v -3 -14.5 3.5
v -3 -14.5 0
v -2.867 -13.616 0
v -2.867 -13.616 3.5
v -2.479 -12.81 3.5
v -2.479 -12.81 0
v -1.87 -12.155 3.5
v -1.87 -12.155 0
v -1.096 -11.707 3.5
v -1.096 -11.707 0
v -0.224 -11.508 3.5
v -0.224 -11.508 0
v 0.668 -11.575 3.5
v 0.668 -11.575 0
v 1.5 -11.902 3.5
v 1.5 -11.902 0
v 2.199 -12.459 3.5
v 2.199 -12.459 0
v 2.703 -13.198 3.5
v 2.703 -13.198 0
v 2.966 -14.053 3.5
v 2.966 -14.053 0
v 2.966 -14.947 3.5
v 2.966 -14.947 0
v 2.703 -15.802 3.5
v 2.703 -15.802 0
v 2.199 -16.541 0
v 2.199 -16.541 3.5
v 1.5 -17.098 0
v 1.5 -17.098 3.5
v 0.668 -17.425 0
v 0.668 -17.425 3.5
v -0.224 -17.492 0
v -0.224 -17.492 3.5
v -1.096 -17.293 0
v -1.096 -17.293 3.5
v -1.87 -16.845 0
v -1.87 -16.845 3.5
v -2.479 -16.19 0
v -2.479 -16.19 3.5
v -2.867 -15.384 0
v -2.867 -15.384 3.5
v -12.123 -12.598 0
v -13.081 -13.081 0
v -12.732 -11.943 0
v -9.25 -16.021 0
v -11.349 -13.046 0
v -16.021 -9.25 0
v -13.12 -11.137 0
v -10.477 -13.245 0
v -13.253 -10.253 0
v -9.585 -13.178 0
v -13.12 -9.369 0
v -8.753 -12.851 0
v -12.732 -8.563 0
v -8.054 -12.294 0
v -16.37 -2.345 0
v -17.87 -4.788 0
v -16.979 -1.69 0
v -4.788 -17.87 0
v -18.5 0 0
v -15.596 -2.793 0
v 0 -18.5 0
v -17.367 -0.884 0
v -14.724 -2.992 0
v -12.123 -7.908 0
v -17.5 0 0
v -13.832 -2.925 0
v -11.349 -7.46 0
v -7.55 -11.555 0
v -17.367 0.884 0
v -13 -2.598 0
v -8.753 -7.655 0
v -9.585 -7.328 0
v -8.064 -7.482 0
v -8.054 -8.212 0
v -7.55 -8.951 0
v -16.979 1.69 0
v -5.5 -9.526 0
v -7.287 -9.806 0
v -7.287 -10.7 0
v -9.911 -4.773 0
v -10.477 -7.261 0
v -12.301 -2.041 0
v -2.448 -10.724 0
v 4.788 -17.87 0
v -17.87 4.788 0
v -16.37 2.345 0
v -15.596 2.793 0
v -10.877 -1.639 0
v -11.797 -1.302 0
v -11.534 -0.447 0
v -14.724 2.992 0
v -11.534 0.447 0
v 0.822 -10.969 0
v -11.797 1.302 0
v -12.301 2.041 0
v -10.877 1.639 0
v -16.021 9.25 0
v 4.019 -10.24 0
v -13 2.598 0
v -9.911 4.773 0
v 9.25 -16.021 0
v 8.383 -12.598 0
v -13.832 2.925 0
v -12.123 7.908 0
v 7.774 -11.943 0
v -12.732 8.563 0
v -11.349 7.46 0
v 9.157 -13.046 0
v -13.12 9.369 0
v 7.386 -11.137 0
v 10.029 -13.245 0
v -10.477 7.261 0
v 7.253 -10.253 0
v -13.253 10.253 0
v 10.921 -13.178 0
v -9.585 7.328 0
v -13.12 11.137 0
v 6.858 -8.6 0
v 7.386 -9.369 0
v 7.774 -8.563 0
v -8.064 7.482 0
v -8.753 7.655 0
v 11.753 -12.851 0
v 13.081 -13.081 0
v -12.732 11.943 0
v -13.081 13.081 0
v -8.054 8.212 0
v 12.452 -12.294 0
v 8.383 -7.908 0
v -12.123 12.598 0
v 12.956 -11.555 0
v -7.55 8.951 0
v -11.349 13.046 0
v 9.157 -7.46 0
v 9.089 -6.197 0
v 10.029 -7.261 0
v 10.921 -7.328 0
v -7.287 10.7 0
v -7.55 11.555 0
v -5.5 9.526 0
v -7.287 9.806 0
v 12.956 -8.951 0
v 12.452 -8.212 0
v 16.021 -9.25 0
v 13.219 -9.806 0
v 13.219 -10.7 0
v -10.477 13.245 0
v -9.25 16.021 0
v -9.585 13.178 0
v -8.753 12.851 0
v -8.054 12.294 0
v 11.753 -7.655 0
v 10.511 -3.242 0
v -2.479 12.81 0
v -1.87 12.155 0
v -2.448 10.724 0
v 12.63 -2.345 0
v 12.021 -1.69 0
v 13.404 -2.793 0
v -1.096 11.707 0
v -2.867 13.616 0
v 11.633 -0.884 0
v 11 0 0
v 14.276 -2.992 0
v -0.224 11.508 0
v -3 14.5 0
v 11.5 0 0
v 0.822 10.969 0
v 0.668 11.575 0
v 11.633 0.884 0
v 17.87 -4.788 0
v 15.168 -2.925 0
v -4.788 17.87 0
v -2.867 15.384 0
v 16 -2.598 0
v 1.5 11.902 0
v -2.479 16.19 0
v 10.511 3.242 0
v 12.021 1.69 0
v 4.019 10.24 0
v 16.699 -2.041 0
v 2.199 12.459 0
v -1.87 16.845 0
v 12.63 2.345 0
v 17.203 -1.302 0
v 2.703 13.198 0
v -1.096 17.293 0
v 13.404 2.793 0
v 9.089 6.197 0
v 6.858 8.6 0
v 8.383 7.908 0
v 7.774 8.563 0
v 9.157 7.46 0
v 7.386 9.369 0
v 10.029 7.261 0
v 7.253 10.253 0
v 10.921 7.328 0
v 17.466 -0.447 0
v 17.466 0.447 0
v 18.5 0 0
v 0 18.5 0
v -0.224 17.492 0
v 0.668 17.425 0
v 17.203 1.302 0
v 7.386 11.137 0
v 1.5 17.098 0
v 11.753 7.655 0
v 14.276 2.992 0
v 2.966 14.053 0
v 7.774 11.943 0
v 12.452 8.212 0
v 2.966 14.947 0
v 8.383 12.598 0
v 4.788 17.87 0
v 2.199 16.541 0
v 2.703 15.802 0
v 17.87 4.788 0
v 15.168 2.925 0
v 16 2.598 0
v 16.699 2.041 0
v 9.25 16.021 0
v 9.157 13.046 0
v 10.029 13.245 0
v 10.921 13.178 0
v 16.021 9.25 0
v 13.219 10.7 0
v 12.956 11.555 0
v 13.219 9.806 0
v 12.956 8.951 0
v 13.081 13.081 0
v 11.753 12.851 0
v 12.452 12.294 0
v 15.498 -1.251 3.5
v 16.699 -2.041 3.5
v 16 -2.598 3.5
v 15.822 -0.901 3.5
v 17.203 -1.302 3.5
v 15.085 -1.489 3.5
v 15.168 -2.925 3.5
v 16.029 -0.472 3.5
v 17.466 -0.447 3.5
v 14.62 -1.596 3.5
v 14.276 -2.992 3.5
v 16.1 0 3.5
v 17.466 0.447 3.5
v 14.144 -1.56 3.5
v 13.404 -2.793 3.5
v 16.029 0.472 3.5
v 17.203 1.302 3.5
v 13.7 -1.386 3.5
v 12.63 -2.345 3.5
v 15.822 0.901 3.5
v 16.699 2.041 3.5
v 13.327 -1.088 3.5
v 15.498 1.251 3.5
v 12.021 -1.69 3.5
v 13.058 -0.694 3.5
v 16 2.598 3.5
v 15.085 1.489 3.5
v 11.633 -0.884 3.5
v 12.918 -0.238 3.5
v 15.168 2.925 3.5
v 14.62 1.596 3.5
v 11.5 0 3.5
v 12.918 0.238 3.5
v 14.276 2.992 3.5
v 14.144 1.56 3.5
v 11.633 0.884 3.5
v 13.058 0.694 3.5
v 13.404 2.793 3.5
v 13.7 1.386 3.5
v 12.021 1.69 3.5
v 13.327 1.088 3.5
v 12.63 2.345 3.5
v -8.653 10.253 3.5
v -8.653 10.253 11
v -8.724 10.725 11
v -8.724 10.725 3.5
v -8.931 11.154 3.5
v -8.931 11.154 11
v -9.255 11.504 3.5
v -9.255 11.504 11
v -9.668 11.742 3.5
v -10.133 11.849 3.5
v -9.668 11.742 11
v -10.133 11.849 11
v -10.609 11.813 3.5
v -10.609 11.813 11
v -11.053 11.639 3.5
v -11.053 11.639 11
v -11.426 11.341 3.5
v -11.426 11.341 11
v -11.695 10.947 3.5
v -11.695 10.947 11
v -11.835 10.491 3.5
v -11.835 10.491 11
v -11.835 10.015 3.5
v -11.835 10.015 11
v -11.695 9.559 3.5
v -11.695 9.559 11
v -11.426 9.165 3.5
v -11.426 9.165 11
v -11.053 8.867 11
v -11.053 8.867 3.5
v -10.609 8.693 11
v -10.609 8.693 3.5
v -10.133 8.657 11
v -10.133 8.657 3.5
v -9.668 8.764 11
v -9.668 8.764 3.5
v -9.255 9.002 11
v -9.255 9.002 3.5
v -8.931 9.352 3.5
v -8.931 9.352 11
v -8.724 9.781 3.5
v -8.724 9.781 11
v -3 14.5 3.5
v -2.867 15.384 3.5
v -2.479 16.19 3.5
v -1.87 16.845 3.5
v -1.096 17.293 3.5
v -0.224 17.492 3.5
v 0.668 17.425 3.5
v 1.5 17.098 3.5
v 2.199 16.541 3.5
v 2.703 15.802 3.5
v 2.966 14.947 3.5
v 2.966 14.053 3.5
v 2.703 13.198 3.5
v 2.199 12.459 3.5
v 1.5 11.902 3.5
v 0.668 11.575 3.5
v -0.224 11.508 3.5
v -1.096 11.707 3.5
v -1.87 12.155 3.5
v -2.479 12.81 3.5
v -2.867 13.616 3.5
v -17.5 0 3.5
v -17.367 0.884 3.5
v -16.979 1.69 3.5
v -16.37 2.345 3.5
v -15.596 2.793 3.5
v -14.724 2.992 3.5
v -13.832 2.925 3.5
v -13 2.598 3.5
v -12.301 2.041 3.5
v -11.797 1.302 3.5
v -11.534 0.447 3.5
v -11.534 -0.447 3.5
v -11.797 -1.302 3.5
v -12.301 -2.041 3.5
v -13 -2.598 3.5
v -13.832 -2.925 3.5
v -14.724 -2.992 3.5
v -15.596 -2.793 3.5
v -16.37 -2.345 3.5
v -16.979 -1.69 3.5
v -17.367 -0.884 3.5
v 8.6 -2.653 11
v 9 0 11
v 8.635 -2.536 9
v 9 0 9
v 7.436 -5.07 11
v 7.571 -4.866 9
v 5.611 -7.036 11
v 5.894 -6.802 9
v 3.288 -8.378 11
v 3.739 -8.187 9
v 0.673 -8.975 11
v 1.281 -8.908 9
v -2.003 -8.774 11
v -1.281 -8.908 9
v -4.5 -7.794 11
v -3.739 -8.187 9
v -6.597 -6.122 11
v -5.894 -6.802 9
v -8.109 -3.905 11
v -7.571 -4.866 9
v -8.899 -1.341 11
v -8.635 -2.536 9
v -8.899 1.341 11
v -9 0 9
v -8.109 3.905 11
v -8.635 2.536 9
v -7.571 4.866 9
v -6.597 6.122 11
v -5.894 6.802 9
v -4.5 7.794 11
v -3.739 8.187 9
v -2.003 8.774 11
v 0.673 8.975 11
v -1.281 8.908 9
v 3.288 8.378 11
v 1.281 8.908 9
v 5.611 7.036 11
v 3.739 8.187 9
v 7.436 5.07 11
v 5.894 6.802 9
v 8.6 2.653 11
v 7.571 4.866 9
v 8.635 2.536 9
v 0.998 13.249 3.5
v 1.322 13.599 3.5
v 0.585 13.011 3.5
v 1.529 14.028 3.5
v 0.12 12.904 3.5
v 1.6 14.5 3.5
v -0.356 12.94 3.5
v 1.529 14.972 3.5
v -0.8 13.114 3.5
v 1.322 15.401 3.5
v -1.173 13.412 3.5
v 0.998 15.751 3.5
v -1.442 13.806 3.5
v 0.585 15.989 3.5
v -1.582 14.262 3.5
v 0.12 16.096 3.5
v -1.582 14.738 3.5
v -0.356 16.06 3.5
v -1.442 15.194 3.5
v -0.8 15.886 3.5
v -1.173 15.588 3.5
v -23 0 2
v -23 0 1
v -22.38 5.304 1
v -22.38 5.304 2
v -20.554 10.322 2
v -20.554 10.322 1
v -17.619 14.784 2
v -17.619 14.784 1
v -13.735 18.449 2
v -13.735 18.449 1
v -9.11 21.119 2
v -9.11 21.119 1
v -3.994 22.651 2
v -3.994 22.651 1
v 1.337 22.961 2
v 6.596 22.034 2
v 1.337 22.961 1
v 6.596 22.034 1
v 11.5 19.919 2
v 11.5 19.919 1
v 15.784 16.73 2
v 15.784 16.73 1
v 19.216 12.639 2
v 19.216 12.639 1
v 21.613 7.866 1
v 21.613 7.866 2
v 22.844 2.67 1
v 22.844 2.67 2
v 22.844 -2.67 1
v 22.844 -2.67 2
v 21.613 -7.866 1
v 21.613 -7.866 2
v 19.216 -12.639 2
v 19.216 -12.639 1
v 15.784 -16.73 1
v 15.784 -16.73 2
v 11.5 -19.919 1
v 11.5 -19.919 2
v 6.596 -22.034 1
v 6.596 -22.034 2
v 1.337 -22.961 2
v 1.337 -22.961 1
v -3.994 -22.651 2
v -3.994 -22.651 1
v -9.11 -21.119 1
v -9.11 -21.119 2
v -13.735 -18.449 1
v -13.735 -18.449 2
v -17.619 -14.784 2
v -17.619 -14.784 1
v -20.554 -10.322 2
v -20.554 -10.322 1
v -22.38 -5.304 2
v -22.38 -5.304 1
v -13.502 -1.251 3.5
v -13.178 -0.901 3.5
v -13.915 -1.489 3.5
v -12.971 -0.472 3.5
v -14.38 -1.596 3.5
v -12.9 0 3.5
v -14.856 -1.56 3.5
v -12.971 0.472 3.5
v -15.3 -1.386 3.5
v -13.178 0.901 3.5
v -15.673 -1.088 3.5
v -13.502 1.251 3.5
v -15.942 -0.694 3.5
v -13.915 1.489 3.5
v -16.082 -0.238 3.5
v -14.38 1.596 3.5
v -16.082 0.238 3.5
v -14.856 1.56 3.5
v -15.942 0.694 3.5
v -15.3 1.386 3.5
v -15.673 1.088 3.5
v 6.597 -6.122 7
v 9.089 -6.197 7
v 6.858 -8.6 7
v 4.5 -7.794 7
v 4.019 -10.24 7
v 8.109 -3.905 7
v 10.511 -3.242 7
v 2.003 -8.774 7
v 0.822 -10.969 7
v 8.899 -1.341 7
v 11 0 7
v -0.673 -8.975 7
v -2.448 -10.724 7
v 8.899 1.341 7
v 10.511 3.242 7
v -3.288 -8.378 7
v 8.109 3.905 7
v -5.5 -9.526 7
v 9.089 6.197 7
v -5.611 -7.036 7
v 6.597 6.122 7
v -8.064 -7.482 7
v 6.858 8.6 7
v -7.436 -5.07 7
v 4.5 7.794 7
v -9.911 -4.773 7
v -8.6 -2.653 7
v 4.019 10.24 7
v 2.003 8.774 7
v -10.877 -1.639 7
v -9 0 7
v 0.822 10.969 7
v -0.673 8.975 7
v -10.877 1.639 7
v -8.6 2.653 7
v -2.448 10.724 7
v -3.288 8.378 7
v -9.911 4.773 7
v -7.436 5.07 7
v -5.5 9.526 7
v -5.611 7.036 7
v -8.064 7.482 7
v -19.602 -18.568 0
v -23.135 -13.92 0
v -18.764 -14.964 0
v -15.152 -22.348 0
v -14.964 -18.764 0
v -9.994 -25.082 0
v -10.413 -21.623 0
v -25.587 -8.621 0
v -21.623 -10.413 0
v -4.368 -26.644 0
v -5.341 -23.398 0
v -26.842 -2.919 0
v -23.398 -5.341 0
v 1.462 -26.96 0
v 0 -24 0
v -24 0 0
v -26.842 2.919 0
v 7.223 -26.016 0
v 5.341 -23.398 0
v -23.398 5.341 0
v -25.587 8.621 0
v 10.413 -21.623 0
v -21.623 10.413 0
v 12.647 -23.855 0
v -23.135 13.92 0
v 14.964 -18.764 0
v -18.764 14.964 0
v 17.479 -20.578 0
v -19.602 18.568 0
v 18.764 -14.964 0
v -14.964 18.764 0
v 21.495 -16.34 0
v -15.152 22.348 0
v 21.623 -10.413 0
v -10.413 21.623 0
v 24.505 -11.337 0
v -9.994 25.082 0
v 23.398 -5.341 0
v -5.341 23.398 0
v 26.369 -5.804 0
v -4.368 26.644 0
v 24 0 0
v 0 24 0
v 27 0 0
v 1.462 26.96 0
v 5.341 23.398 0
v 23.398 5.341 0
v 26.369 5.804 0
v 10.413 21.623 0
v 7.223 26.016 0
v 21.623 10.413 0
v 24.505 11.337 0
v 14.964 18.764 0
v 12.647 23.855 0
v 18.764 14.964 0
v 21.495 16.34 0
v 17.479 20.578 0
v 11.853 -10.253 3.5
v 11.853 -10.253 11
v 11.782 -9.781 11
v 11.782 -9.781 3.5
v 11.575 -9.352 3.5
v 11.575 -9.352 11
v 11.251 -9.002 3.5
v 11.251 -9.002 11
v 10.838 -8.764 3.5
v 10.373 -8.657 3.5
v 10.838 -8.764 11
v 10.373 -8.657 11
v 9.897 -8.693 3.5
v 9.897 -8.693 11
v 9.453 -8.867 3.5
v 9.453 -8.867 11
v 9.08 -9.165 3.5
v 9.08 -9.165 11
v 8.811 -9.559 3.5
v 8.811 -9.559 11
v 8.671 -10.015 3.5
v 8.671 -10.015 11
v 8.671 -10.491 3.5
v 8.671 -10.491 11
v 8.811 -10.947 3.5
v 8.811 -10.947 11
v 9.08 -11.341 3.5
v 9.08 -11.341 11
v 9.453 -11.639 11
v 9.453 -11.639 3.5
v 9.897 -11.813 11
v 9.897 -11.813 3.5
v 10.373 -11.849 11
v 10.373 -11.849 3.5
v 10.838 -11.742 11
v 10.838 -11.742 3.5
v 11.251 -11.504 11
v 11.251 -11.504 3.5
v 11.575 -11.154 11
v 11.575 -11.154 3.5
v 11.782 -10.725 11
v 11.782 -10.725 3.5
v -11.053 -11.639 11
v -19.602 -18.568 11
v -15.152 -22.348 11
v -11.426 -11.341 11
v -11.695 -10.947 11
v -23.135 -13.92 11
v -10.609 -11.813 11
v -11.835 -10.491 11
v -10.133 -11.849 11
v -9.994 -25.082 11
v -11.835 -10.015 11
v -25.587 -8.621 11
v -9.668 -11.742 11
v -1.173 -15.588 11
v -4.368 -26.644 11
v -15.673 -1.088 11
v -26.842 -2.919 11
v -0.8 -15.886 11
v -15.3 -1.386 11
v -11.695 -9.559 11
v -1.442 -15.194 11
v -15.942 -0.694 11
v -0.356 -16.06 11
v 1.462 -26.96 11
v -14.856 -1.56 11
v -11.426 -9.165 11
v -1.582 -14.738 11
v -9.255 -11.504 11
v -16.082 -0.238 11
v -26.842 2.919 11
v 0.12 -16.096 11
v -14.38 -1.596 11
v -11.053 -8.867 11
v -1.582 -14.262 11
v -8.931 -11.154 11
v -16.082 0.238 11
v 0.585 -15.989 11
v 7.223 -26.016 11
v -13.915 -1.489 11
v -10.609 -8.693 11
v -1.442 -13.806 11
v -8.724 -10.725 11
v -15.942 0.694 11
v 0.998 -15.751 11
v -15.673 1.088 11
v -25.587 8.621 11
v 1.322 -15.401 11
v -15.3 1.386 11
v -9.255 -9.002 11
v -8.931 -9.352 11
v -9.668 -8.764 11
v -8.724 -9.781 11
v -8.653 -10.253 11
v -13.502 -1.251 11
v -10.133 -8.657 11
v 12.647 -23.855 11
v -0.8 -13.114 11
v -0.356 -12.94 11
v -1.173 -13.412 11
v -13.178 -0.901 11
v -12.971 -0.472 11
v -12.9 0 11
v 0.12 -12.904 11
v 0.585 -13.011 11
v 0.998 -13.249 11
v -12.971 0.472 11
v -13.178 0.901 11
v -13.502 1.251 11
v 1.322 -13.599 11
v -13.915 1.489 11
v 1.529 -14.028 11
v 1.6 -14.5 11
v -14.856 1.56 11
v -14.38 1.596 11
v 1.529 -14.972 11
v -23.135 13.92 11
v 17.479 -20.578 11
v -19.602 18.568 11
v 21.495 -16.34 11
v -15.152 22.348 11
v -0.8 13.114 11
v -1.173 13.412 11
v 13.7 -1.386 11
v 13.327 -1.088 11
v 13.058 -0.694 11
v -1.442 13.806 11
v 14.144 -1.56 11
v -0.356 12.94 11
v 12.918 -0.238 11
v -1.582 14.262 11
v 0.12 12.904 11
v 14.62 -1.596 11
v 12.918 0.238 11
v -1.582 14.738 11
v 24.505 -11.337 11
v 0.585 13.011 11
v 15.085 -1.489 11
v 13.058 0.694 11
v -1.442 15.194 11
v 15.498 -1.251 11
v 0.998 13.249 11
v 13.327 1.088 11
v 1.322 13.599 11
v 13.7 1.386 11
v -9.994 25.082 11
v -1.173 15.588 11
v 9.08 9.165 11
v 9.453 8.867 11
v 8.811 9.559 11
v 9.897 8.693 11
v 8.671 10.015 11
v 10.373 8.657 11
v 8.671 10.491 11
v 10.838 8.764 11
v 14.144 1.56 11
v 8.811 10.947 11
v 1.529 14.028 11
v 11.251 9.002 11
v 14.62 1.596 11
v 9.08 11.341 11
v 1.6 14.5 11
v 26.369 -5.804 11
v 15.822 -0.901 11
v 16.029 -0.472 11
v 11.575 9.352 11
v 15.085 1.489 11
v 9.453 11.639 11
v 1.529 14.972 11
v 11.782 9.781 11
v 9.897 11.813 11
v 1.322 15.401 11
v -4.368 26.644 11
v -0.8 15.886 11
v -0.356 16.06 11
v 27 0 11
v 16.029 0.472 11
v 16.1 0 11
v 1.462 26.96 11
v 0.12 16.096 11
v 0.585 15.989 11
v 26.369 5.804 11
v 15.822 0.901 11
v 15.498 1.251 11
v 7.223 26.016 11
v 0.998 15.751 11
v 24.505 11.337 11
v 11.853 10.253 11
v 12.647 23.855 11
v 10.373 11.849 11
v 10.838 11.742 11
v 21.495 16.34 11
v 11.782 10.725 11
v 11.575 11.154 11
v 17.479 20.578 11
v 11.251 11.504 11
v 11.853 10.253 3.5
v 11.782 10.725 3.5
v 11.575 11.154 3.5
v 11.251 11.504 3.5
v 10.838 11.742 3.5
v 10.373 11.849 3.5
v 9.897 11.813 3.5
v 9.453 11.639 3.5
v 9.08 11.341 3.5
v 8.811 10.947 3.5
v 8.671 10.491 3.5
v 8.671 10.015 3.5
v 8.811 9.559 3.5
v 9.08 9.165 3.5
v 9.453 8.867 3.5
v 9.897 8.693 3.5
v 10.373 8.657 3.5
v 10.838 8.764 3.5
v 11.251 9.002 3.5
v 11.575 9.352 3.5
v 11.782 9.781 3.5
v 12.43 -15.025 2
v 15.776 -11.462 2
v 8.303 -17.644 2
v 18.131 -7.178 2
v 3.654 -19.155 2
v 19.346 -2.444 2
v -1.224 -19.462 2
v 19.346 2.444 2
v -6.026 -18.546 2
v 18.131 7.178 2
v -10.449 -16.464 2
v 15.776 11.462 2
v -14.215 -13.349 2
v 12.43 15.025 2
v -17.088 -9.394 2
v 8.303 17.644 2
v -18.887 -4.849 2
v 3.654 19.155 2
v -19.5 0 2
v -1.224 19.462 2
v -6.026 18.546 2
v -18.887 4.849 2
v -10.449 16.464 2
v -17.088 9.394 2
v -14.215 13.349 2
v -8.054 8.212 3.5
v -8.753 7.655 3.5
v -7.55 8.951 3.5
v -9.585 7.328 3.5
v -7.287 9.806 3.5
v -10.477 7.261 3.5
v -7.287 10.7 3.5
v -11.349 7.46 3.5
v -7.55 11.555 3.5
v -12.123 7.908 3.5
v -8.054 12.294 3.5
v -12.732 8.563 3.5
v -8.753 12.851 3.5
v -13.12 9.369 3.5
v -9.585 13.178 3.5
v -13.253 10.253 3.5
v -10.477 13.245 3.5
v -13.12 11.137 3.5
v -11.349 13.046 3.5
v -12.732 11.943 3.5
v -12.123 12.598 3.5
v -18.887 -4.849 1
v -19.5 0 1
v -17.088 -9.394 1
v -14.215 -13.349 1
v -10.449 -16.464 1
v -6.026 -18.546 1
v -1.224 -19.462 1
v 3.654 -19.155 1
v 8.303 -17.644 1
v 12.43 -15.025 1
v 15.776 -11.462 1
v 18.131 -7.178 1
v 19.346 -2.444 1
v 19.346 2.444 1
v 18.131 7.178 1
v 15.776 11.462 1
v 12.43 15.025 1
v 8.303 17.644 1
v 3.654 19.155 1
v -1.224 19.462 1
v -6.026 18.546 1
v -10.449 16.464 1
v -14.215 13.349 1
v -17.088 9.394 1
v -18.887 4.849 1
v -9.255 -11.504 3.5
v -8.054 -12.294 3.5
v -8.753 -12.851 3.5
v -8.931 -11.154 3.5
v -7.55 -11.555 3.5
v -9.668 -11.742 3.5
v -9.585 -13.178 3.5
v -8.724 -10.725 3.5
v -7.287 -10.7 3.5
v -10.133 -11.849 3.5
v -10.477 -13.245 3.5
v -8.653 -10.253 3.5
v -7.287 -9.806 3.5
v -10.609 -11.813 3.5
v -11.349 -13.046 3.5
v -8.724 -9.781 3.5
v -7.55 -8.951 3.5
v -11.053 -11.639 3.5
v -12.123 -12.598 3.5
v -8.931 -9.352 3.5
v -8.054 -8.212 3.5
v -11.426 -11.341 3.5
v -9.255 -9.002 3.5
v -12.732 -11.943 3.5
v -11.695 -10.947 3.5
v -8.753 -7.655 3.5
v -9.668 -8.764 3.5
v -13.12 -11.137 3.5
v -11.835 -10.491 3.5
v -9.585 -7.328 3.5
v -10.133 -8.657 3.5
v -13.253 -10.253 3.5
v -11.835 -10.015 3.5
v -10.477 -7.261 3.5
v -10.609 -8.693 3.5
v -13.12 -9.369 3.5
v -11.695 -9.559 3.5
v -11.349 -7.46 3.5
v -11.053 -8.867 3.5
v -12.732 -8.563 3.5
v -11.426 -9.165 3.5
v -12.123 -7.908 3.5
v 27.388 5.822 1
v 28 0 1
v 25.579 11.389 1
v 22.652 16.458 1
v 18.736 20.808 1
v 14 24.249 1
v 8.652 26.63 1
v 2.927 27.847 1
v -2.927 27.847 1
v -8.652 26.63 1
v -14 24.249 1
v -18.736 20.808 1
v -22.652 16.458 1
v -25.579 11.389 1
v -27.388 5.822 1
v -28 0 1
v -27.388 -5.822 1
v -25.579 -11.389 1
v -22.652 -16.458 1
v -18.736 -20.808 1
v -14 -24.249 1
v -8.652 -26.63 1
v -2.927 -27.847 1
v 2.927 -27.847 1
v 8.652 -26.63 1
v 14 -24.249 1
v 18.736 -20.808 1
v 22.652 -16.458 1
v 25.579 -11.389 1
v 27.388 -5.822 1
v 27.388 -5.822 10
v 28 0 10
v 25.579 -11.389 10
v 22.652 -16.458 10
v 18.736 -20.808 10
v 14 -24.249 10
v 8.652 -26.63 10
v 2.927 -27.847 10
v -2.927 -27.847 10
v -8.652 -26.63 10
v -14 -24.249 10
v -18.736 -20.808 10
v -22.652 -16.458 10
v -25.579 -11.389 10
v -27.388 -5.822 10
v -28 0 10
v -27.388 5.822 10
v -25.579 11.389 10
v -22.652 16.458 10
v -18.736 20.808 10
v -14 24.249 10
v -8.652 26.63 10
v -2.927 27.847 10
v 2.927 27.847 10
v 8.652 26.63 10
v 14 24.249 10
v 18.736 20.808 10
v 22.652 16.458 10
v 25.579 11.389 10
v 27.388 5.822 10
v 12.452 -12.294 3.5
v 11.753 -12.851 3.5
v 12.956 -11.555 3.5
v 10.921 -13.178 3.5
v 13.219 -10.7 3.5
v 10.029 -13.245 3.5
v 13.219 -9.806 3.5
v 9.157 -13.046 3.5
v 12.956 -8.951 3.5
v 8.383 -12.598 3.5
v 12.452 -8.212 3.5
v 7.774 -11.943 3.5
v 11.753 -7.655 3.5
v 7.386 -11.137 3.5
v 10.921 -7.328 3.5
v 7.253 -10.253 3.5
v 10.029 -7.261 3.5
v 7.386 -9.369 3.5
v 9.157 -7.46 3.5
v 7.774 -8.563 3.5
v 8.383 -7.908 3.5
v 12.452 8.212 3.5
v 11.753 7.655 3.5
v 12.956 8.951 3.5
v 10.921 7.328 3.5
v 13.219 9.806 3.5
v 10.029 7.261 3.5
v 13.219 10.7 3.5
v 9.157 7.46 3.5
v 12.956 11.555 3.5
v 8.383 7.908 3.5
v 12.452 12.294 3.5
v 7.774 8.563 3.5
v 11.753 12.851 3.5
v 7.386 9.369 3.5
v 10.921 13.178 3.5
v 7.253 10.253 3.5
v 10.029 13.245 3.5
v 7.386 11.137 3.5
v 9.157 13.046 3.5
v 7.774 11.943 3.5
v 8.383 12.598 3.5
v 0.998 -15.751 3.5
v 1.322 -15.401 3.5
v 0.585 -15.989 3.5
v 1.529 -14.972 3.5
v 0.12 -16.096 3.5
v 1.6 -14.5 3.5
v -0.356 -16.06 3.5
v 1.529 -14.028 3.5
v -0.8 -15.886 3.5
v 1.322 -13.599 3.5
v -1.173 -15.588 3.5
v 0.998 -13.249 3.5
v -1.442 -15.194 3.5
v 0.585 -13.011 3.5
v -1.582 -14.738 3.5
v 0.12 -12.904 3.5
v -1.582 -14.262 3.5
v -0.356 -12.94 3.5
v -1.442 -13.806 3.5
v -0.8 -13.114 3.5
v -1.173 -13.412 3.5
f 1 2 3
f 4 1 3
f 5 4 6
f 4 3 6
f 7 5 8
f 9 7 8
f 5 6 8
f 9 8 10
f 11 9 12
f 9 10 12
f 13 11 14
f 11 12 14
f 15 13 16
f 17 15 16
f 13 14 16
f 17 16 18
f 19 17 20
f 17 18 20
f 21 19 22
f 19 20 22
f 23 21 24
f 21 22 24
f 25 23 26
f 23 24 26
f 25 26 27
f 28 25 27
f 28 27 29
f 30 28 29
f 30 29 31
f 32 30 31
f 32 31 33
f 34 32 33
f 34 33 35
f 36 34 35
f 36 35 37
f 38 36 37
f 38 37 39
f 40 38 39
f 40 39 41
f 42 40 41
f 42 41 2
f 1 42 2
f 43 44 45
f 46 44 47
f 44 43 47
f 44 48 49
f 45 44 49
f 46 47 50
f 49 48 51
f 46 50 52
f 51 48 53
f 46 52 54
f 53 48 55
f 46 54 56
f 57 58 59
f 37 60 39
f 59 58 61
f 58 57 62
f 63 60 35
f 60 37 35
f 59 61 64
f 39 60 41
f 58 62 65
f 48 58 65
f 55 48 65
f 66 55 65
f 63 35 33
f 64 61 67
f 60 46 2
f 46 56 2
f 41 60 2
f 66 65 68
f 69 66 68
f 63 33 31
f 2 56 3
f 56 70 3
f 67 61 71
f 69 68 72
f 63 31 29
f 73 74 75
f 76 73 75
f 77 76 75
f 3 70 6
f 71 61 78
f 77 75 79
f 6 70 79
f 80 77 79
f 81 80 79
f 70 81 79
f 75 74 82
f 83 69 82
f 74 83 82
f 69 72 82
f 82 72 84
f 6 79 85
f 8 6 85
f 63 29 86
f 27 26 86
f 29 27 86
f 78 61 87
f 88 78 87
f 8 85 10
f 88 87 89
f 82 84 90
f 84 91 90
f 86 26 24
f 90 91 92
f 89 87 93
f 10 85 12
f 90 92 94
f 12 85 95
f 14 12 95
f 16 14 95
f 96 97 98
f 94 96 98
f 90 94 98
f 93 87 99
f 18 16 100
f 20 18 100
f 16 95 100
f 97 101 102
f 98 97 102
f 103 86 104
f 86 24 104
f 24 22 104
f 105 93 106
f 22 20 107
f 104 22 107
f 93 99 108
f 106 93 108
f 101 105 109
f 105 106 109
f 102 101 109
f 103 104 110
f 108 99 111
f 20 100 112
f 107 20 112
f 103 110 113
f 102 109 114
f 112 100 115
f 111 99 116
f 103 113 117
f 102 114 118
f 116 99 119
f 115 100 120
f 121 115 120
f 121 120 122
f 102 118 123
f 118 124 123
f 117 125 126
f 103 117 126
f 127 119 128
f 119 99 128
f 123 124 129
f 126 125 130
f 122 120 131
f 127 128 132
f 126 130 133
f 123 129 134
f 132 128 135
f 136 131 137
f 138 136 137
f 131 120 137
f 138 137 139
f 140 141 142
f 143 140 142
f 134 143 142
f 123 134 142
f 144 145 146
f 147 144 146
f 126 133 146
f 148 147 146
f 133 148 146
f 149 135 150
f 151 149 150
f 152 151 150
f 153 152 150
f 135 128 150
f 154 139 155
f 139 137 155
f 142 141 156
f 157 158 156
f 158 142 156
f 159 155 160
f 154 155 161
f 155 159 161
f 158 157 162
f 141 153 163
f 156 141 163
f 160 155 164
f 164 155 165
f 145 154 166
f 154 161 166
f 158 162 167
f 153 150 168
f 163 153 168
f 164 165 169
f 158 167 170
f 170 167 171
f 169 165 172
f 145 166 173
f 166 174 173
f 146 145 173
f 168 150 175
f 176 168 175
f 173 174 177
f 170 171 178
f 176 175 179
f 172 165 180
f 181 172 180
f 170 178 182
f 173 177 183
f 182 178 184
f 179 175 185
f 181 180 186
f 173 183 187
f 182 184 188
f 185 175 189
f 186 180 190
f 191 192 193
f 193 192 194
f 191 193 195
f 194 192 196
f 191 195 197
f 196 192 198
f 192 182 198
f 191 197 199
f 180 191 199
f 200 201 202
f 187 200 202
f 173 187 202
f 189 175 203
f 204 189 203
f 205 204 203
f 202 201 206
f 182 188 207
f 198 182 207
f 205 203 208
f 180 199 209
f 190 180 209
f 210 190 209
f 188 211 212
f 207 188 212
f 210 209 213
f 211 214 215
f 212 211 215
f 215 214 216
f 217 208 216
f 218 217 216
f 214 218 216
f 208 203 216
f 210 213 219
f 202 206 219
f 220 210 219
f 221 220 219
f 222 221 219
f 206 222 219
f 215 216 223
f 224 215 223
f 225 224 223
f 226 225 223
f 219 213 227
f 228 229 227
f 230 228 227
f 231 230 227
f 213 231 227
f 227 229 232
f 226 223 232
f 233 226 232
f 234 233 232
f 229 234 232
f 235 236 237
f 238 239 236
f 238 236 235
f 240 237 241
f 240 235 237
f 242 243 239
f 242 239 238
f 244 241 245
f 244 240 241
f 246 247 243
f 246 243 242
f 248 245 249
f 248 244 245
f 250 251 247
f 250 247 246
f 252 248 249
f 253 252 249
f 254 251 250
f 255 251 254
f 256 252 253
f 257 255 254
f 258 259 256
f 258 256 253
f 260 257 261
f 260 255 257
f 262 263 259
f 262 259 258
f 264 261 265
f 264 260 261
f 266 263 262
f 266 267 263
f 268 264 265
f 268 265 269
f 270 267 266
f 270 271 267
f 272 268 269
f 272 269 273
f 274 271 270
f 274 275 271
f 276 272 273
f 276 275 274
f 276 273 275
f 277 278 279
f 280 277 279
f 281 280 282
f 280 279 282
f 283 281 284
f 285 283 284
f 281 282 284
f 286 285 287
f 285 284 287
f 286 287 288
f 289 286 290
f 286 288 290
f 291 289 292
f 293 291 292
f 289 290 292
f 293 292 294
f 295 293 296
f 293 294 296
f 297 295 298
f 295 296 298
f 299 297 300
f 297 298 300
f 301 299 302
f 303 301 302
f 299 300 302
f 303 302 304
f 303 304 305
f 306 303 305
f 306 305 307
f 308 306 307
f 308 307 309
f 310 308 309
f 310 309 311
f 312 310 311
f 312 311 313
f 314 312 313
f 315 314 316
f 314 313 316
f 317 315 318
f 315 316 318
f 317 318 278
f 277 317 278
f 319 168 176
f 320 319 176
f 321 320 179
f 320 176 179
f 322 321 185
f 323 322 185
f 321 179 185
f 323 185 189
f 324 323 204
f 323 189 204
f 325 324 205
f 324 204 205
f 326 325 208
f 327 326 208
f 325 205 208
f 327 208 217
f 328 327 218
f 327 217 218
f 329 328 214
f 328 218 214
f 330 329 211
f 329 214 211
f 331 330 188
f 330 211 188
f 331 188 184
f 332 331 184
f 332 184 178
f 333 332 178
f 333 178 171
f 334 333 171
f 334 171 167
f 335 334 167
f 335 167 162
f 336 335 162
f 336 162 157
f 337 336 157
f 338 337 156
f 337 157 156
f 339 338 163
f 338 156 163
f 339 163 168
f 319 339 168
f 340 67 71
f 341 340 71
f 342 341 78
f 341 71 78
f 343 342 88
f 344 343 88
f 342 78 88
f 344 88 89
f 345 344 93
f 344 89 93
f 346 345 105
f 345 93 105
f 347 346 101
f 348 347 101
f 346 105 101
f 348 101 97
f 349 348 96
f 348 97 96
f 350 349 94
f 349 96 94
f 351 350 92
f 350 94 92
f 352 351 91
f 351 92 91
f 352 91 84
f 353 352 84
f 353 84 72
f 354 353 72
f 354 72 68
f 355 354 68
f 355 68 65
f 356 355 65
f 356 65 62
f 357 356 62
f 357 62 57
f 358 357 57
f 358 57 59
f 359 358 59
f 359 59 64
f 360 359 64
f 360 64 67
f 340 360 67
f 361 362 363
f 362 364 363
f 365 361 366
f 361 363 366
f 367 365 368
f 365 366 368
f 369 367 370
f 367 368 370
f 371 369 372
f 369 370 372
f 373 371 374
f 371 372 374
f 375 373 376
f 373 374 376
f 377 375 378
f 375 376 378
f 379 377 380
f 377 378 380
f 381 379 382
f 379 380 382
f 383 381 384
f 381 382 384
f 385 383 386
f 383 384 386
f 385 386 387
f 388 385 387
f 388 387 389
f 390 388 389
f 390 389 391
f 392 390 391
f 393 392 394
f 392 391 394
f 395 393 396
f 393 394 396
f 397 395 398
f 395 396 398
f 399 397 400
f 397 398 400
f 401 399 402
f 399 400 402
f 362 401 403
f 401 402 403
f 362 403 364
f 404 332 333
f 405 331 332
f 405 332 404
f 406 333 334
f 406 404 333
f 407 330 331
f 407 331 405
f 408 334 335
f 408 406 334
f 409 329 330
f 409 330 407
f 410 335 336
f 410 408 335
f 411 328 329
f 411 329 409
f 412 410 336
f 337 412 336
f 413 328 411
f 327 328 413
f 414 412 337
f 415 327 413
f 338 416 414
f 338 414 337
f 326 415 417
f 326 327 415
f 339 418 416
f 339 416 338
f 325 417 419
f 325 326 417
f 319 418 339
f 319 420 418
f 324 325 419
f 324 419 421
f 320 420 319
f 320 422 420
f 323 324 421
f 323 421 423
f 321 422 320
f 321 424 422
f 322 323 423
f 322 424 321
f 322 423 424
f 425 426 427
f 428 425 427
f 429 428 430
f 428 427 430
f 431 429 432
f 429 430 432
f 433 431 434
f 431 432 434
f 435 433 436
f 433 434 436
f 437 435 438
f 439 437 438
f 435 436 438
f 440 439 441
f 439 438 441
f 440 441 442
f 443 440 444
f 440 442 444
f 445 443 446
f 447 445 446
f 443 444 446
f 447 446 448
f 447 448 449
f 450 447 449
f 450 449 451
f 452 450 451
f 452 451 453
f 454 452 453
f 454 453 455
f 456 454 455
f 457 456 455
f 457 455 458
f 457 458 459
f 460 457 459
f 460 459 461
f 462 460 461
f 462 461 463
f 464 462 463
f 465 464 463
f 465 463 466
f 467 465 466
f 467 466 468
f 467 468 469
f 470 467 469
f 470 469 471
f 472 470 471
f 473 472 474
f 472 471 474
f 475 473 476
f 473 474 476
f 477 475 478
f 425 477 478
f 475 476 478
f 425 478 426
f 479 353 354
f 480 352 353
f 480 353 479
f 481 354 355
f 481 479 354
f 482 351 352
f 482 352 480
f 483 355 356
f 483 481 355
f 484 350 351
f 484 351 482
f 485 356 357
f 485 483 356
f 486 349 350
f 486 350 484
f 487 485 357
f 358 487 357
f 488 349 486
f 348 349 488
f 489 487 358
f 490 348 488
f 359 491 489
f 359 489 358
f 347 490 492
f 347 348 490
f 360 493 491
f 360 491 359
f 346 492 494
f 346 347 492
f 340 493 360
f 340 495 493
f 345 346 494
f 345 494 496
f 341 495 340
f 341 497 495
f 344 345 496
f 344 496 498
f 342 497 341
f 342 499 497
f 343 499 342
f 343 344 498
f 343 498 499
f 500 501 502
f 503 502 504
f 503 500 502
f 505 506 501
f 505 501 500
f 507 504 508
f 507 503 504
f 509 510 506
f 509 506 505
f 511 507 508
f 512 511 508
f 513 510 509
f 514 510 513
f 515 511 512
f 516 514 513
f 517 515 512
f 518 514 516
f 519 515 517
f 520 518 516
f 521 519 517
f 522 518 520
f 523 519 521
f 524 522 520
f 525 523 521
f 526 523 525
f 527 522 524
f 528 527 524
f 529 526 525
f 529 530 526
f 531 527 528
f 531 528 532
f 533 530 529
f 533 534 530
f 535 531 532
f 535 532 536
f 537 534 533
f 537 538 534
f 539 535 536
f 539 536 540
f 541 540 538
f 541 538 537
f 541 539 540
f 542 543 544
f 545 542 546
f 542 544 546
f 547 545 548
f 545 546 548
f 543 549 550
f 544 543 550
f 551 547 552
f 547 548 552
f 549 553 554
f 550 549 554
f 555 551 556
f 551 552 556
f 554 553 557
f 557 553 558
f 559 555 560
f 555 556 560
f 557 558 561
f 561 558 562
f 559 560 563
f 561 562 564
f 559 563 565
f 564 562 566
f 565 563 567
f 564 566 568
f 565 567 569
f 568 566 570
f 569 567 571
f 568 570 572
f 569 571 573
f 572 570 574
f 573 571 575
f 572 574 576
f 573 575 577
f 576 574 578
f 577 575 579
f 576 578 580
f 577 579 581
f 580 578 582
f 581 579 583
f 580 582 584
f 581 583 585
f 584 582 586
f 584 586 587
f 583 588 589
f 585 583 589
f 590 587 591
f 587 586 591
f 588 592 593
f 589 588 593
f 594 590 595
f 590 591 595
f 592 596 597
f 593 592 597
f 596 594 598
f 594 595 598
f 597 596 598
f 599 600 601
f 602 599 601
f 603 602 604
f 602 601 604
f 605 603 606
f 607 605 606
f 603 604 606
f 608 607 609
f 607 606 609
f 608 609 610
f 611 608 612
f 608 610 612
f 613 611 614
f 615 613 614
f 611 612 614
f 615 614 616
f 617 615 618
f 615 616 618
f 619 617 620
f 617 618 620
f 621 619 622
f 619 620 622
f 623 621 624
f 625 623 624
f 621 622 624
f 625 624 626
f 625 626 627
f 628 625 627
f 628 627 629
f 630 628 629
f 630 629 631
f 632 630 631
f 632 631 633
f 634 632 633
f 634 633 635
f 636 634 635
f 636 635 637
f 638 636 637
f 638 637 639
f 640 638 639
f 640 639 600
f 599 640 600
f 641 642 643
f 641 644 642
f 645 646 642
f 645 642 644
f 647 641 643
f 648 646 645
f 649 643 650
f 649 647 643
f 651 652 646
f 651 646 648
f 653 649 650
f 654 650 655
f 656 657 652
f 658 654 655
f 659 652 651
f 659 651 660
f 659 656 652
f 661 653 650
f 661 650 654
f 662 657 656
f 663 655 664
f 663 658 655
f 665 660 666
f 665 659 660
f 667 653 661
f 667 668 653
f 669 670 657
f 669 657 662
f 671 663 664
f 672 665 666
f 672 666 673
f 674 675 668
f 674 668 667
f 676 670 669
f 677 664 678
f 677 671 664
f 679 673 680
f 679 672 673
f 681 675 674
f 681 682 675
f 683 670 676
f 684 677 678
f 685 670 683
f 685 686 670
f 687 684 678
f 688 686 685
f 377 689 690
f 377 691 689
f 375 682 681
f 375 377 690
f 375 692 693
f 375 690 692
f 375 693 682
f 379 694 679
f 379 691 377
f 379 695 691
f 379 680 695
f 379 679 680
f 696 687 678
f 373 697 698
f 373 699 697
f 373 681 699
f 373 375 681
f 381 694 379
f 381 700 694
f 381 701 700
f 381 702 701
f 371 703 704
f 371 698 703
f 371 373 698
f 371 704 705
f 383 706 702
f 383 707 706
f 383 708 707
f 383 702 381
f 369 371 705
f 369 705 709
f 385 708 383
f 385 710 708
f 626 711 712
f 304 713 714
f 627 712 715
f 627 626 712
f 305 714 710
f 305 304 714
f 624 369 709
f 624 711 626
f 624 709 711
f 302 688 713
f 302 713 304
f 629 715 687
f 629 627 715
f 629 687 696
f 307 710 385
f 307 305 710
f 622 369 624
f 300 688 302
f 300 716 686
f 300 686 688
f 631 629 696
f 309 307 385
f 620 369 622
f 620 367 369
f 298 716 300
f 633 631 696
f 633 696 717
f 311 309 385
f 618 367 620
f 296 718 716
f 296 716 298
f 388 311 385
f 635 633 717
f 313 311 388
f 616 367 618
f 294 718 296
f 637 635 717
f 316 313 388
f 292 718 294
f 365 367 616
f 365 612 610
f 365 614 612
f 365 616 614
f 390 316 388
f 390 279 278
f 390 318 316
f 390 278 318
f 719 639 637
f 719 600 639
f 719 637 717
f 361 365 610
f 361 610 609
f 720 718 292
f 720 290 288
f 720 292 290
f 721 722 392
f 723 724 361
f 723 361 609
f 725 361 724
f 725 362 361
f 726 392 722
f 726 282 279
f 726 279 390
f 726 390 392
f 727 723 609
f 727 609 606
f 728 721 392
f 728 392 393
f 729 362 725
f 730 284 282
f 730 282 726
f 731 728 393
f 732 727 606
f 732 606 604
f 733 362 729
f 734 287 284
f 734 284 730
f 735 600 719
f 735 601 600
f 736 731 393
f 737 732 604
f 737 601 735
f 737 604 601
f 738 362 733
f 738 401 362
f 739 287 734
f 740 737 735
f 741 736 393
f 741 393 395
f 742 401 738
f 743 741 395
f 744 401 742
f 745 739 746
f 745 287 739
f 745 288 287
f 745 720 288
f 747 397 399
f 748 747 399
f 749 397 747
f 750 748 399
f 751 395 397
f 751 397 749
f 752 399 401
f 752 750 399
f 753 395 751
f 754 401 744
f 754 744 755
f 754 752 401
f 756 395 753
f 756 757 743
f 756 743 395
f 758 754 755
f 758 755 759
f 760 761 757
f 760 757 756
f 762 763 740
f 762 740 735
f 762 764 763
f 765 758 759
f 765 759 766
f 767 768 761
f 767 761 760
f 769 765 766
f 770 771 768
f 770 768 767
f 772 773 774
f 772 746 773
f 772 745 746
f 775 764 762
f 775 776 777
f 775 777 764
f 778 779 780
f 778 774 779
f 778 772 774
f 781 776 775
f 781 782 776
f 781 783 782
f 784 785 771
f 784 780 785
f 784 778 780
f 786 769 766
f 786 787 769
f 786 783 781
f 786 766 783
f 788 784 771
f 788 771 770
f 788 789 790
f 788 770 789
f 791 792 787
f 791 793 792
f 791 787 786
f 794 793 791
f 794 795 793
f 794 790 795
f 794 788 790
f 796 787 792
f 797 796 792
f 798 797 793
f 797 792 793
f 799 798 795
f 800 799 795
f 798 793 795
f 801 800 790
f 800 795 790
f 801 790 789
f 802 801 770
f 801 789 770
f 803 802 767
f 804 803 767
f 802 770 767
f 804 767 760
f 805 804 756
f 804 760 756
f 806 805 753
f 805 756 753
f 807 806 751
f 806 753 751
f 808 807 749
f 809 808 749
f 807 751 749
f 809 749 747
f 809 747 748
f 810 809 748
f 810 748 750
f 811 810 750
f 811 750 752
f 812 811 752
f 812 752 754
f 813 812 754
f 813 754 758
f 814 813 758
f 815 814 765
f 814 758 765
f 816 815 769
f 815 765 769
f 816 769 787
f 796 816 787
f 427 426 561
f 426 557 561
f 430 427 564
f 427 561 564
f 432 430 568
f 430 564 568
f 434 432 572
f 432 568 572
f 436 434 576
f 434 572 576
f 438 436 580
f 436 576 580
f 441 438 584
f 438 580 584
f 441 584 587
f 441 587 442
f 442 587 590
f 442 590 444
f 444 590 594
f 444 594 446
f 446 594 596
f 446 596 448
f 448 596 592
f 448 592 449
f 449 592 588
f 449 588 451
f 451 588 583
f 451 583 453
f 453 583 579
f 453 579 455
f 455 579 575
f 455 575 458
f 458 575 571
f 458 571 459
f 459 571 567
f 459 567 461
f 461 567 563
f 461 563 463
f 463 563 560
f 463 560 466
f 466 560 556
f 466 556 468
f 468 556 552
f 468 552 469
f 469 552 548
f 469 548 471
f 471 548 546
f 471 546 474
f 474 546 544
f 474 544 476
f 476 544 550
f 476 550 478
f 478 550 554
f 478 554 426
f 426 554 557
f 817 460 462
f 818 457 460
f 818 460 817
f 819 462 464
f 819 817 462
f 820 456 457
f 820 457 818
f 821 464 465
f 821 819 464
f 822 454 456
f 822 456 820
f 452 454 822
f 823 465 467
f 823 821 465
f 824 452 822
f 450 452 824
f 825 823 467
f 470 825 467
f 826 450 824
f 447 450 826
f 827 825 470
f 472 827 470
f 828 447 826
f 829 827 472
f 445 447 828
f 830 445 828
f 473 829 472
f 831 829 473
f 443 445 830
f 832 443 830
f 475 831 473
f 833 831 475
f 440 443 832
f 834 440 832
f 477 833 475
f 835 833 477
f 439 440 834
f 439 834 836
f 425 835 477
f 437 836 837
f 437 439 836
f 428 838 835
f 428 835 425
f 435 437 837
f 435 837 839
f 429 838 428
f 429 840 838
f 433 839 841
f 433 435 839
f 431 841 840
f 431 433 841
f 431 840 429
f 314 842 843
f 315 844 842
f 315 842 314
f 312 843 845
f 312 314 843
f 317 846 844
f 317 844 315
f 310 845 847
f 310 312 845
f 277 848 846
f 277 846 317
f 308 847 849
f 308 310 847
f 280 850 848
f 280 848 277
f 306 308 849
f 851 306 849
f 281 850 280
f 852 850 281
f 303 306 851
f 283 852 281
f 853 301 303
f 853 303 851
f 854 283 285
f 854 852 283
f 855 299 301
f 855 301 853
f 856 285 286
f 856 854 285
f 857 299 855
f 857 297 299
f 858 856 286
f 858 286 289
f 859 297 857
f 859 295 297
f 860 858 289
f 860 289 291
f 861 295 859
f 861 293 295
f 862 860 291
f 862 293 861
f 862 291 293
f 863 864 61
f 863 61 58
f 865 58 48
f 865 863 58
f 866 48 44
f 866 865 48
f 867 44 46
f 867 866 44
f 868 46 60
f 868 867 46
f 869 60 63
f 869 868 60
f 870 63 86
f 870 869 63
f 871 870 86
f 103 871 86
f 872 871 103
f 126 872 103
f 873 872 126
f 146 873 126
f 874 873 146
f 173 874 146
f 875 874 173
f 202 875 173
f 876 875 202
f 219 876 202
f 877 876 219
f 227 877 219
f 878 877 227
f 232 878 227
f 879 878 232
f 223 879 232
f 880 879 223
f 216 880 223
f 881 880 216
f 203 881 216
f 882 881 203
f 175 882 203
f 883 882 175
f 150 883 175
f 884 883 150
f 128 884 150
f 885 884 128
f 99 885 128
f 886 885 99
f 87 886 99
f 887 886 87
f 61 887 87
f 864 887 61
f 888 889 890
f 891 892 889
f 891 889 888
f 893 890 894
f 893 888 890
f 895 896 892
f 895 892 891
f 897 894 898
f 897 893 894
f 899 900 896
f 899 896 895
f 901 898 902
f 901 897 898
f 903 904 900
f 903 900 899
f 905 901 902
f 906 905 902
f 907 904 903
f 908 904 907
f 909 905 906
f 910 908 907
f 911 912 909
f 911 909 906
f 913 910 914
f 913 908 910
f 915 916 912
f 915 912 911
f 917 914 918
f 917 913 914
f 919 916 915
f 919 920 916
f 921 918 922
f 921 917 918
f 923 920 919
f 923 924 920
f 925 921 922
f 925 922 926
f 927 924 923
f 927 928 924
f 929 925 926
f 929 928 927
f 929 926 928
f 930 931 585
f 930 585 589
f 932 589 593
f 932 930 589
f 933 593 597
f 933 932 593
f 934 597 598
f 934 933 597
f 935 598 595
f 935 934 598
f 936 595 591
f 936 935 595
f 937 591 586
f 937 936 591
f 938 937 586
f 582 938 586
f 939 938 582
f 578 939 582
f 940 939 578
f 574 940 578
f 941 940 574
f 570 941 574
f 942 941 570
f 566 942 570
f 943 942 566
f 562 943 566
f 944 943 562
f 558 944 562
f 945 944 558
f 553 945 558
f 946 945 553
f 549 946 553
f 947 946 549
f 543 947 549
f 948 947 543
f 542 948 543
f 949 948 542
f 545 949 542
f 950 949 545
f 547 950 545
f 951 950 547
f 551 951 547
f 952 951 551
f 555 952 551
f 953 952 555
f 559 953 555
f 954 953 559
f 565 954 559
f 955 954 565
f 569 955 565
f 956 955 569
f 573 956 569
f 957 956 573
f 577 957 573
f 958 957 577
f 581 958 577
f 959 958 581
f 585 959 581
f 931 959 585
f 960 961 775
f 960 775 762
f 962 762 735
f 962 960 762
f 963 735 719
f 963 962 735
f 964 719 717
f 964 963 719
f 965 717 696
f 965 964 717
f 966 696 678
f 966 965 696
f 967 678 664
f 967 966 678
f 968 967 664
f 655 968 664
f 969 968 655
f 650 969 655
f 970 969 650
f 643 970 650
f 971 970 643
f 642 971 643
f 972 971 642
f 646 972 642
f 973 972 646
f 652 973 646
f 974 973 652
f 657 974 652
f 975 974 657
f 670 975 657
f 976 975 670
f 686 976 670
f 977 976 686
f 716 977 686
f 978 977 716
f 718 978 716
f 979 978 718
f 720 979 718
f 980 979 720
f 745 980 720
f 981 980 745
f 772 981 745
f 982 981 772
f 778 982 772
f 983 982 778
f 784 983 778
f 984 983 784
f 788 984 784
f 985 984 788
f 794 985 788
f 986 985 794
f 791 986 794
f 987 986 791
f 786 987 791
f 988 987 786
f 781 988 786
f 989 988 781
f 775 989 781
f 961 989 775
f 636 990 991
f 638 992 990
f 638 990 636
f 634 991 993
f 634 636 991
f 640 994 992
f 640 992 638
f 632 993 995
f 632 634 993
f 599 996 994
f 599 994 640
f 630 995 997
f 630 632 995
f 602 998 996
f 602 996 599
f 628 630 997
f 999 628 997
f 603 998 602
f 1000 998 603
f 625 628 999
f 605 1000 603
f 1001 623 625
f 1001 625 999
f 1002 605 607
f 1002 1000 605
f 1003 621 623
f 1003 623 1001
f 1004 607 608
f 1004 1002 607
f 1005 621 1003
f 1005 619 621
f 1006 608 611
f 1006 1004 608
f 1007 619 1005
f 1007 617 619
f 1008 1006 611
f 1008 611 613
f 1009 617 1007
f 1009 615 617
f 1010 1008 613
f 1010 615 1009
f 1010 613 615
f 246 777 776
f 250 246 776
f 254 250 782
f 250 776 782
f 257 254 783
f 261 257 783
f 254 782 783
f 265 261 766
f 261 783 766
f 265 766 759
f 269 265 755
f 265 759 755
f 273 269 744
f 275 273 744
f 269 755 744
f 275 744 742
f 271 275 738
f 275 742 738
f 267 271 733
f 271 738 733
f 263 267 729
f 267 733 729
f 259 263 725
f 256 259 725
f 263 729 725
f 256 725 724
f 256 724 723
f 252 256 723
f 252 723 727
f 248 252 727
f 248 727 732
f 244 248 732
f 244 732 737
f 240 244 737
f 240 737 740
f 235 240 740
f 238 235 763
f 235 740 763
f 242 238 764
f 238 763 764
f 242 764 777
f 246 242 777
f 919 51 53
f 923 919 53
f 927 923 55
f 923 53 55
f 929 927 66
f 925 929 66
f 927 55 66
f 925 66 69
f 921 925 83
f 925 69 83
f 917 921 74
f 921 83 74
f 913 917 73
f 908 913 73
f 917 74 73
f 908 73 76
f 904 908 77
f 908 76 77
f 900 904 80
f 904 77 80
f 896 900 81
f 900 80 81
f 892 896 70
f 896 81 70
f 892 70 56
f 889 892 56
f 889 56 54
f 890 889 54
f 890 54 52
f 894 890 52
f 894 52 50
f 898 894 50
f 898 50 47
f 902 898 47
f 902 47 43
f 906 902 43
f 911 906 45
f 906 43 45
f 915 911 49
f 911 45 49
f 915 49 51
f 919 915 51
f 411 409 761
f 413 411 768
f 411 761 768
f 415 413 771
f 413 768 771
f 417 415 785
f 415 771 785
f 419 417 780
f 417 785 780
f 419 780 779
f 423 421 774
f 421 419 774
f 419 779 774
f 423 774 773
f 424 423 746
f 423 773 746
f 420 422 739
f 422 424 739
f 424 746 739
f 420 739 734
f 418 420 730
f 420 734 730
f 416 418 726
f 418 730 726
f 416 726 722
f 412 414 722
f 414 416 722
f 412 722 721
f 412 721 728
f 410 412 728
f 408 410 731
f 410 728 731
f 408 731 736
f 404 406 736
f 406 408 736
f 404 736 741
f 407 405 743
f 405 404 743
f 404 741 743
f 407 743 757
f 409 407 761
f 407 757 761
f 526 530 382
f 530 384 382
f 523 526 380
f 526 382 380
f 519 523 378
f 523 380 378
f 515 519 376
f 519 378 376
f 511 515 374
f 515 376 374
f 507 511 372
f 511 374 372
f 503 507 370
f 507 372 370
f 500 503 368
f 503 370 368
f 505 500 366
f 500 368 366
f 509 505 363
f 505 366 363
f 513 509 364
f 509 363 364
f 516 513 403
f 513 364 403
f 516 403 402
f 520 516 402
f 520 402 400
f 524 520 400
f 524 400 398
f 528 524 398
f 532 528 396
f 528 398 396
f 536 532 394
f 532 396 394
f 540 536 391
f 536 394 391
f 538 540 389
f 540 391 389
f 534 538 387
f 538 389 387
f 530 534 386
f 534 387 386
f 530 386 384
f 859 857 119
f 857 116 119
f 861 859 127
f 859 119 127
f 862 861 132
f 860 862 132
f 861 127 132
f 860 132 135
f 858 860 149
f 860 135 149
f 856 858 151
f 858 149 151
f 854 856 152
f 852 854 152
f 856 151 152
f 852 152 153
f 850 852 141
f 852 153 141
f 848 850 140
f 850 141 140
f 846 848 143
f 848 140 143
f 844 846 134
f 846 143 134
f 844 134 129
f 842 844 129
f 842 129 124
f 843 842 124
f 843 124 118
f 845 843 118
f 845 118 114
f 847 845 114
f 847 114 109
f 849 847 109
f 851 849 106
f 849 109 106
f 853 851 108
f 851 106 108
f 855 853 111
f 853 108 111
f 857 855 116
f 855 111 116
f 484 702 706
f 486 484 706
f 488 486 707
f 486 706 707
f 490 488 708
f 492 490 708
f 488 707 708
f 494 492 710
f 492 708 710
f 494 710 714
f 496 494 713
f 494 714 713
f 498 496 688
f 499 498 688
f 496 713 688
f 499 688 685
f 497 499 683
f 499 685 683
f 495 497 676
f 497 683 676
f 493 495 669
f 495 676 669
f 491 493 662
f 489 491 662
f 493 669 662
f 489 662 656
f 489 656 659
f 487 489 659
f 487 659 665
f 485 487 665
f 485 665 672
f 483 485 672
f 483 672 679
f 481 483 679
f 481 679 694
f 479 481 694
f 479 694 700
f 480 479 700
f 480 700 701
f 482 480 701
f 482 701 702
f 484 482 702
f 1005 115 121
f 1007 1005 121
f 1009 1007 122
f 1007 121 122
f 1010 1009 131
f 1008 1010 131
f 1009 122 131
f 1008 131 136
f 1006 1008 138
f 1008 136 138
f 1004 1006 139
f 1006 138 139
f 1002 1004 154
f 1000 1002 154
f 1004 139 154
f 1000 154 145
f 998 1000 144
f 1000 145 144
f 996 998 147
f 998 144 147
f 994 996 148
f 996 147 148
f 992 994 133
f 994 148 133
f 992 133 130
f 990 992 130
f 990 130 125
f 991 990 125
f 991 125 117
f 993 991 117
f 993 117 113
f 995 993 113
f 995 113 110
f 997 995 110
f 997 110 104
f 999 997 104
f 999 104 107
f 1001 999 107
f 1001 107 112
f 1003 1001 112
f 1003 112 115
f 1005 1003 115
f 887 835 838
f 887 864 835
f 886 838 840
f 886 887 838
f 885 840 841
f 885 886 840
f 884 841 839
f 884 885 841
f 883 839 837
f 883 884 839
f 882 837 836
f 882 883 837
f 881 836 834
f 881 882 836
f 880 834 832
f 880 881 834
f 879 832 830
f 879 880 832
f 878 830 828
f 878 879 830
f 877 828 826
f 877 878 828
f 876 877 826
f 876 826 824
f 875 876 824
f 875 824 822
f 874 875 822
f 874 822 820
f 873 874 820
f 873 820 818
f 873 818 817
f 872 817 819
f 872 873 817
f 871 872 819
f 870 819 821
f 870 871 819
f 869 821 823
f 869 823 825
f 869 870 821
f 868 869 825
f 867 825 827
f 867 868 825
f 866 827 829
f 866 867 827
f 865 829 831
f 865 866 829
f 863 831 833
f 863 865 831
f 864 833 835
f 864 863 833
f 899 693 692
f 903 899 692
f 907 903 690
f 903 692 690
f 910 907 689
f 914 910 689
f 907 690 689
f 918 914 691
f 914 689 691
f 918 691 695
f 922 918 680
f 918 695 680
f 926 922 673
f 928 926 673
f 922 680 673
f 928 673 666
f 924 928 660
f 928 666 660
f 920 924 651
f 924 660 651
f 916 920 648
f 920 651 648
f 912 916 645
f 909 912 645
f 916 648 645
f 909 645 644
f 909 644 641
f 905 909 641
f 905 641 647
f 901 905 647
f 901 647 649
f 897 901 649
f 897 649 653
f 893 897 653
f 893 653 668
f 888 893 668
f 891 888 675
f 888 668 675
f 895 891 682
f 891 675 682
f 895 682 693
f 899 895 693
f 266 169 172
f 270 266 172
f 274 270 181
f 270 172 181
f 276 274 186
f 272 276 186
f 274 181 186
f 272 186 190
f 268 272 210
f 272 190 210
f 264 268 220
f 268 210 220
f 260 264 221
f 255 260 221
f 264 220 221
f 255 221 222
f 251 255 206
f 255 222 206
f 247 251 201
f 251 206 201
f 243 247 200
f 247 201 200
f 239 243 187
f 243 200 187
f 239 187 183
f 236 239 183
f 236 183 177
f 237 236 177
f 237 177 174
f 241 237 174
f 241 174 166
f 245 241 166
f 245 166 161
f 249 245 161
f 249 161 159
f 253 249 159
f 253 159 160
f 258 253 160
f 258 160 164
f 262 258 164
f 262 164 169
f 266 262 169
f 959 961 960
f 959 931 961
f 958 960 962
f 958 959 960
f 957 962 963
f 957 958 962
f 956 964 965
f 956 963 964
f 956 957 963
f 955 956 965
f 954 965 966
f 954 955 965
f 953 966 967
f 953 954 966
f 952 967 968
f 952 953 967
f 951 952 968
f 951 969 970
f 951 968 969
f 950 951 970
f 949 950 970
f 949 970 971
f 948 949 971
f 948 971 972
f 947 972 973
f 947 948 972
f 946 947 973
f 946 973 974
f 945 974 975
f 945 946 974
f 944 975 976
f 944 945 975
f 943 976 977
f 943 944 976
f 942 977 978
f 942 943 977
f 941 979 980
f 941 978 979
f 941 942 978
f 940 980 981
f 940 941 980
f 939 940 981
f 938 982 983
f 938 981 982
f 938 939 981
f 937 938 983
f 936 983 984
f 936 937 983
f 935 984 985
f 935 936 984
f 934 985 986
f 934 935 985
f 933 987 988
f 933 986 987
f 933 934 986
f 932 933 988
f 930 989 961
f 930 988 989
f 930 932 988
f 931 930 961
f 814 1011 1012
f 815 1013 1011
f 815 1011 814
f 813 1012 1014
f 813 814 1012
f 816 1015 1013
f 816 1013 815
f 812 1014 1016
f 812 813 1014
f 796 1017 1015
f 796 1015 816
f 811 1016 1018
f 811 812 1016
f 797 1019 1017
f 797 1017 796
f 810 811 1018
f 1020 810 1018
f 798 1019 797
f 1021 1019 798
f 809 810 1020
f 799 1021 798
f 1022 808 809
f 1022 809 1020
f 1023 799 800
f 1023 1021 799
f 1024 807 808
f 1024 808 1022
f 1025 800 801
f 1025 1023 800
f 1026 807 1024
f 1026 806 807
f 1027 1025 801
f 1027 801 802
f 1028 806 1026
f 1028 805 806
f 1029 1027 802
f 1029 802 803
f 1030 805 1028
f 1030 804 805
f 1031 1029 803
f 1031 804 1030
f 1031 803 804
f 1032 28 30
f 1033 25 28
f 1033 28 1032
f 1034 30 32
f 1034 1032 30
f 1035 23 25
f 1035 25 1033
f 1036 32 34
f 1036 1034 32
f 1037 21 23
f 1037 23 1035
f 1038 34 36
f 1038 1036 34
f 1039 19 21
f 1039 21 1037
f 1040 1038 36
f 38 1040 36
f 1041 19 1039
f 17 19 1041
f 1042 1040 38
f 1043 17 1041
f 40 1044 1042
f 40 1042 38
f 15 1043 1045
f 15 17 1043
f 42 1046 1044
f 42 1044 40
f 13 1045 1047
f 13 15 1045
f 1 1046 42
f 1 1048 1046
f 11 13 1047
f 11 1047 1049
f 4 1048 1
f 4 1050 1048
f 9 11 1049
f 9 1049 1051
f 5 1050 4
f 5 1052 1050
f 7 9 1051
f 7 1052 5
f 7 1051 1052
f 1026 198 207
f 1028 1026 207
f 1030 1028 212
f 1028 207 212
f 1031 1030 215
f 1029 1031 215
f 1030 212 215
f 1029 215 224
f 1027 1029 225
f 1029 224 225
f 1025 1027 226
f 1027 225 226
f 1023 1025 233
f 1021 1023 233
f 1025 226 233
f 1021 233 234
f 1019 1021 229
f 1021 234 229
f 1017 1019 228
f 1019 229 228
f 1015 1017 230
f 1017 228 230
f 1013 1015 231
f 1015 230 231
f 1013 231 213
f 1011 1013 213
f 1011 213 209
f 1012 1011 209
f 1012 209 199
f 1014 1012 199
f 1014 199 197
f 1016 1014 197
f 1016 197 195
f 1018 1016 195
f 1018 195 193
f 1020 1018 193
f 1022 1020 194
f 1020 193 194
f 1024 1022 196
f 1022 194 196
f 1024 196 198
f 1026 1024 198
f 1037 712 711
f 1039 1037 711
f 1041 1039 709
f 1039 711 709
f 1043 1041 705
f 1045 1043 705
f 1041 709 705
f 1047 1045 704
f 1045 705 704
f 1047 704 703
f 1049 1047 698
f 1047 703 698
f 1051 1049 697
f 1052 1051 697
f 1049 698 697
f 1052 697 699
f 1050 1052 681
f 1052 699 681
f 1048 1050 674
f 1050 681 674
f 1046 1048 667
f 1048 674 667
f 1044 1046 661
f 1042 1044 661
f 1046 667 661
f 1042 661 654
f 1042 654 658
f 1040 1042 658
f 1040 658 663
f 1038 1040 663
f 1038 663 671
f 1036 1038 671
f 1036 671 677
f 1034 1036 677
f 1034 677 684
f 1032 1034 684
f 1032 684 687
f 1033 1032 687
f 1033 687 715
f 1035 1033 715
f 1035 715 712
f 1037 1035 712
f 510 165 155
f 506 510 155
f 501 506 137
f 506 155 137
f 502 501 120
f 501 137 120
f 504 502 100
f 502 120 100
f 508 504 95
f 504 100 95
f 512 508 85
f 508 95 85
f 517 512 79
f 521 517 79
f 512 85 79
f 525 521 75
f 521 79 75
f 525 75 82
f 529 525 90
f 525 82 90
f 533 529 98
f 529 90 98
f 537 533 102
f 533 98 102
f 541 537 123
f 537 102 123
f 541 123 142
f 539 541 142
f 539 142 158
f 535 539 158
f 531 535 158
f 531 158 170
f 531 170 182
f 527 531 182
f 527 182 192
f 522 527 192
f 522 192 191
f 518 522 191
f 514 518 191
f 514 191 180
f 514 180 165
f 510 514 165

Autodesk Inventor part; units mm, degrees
ref_plane "YZ Plane" through (0, 0, 0) normal (1, 0, 0) x (0, 1, 0)
ref_plane "XZ Plane" through (0, 0, 0) normal (0, 1, 0) x (-1, 0, 0)
ref_plane "XY Plane" through (0, 0, 0) normal (0, 0, 1) x (1, 0, 0)
sketch "草图1" plane through (0, 0, 0) normal (0, 0, 1) x (1, 0, 0)
  circle A0 centre (0, 0) radius 28
  circle A1 centre (0, 0) radius 11
  dimension "d0" = 56
  dimension "d1" = 22
extrude "拉伸1" add sketch "草图1" along normal blind 9
sketch "草图2" plane through (0, 0, 9) normal (0, 0, 1) x (1, 0, 0)
  circle A0 centre (0, 0) radius 28 projected
  circle A1 centre (0, 0) radius 9
  dimension "d4" = 18
extrude "拉伸2" add sketch "草图2" along normal blind 2
sketch "草图3" plane through (0, 0, 11) normal (0, 0, 1) x (1, 0, 0)
  circle A0 centre (0, 0) radius 14.5 construction
  line L0 (-36.9419, 0) -> (43.6936, 0) construction
  circle A1 centre (14.5, 0) radius 1.6
  circle A2 centre (10.253, 10.253) radius 1.6
  circle A3 centre (0, 14.5) radius 1.6
  circle A4 centre (-10.253, 10.253) radius 1.6
  circle A5 centre (-14.5, 0) radius 1.6
  circle A6 centre (-10.253, -10.253) radius 1.6
  circle A7 centre (0, -14.5) radius 1.6
  circle A8 centre (10.253, -10.253) radius 1.6
  dimension "d7" = 29
  dimension "d8" = 3.2
  dimension "d11" = 360
extrude "拉伸3" cut sketch "草图3" against normal through all
chamfer "倒角1" distance 1 angle 45 2 edges at (-28, 0, 0) (-28, 0, 11)
sketch "草图4" plane through (0, 0, 0) normal (0, 0, -1) x (-1, 0, 0)
  circle A0 centre (0, 0) radius 19.5
  circle A1 centre (0, 0) radius 23
  dimension "d18" = 39
  dimension "d19" = 46
extrude "拉伸4" cut sketch "草图4" against normal blind 2
chamfer "倒角2" distance 1 angle 45 2 edges at (23, 0, 0) (19.5, 0, 0)
sketch "草图5" plane through (0, 0, 0) normal (0, 0, -1) x (-1, 0, 0)
  circle A0 centre (0, 14.5) radius 1.6 projected
  circle A1 centre (0, 14.5) radius 3
  circle A2 centre (-10.253, 10.253) radius 3
  circle A3 centre (-14.5, 0) radius 3
  circle A4 centre (-10.253, -10.253) radius 3
  circle A5 centre (0, -14.5) radius 3
  circle A6 centre (10.253, -10.253) radius 3
  circle A7 centre (14.5, 0) radius 3
  circle A8 centre (10.253, 10.253) radius 3
  point P0 (0, 0)
  dimension "d25" = 6
  dimension "d28" = 360
extrude "拉伸5" cut sketch "草图5" against normal blind 3.5
sketch "草图6" plane through (0, 0, 9) normal (0, 0, -1) x (-1, 0, 0)
  circle A0 centre (0, 0) radius 9 projected
  circle A1 centre (0, 0) radius 11 projected
extrude "拉伸6" add sketch "草图6" along normal blind 2
properties part number "内轮"
